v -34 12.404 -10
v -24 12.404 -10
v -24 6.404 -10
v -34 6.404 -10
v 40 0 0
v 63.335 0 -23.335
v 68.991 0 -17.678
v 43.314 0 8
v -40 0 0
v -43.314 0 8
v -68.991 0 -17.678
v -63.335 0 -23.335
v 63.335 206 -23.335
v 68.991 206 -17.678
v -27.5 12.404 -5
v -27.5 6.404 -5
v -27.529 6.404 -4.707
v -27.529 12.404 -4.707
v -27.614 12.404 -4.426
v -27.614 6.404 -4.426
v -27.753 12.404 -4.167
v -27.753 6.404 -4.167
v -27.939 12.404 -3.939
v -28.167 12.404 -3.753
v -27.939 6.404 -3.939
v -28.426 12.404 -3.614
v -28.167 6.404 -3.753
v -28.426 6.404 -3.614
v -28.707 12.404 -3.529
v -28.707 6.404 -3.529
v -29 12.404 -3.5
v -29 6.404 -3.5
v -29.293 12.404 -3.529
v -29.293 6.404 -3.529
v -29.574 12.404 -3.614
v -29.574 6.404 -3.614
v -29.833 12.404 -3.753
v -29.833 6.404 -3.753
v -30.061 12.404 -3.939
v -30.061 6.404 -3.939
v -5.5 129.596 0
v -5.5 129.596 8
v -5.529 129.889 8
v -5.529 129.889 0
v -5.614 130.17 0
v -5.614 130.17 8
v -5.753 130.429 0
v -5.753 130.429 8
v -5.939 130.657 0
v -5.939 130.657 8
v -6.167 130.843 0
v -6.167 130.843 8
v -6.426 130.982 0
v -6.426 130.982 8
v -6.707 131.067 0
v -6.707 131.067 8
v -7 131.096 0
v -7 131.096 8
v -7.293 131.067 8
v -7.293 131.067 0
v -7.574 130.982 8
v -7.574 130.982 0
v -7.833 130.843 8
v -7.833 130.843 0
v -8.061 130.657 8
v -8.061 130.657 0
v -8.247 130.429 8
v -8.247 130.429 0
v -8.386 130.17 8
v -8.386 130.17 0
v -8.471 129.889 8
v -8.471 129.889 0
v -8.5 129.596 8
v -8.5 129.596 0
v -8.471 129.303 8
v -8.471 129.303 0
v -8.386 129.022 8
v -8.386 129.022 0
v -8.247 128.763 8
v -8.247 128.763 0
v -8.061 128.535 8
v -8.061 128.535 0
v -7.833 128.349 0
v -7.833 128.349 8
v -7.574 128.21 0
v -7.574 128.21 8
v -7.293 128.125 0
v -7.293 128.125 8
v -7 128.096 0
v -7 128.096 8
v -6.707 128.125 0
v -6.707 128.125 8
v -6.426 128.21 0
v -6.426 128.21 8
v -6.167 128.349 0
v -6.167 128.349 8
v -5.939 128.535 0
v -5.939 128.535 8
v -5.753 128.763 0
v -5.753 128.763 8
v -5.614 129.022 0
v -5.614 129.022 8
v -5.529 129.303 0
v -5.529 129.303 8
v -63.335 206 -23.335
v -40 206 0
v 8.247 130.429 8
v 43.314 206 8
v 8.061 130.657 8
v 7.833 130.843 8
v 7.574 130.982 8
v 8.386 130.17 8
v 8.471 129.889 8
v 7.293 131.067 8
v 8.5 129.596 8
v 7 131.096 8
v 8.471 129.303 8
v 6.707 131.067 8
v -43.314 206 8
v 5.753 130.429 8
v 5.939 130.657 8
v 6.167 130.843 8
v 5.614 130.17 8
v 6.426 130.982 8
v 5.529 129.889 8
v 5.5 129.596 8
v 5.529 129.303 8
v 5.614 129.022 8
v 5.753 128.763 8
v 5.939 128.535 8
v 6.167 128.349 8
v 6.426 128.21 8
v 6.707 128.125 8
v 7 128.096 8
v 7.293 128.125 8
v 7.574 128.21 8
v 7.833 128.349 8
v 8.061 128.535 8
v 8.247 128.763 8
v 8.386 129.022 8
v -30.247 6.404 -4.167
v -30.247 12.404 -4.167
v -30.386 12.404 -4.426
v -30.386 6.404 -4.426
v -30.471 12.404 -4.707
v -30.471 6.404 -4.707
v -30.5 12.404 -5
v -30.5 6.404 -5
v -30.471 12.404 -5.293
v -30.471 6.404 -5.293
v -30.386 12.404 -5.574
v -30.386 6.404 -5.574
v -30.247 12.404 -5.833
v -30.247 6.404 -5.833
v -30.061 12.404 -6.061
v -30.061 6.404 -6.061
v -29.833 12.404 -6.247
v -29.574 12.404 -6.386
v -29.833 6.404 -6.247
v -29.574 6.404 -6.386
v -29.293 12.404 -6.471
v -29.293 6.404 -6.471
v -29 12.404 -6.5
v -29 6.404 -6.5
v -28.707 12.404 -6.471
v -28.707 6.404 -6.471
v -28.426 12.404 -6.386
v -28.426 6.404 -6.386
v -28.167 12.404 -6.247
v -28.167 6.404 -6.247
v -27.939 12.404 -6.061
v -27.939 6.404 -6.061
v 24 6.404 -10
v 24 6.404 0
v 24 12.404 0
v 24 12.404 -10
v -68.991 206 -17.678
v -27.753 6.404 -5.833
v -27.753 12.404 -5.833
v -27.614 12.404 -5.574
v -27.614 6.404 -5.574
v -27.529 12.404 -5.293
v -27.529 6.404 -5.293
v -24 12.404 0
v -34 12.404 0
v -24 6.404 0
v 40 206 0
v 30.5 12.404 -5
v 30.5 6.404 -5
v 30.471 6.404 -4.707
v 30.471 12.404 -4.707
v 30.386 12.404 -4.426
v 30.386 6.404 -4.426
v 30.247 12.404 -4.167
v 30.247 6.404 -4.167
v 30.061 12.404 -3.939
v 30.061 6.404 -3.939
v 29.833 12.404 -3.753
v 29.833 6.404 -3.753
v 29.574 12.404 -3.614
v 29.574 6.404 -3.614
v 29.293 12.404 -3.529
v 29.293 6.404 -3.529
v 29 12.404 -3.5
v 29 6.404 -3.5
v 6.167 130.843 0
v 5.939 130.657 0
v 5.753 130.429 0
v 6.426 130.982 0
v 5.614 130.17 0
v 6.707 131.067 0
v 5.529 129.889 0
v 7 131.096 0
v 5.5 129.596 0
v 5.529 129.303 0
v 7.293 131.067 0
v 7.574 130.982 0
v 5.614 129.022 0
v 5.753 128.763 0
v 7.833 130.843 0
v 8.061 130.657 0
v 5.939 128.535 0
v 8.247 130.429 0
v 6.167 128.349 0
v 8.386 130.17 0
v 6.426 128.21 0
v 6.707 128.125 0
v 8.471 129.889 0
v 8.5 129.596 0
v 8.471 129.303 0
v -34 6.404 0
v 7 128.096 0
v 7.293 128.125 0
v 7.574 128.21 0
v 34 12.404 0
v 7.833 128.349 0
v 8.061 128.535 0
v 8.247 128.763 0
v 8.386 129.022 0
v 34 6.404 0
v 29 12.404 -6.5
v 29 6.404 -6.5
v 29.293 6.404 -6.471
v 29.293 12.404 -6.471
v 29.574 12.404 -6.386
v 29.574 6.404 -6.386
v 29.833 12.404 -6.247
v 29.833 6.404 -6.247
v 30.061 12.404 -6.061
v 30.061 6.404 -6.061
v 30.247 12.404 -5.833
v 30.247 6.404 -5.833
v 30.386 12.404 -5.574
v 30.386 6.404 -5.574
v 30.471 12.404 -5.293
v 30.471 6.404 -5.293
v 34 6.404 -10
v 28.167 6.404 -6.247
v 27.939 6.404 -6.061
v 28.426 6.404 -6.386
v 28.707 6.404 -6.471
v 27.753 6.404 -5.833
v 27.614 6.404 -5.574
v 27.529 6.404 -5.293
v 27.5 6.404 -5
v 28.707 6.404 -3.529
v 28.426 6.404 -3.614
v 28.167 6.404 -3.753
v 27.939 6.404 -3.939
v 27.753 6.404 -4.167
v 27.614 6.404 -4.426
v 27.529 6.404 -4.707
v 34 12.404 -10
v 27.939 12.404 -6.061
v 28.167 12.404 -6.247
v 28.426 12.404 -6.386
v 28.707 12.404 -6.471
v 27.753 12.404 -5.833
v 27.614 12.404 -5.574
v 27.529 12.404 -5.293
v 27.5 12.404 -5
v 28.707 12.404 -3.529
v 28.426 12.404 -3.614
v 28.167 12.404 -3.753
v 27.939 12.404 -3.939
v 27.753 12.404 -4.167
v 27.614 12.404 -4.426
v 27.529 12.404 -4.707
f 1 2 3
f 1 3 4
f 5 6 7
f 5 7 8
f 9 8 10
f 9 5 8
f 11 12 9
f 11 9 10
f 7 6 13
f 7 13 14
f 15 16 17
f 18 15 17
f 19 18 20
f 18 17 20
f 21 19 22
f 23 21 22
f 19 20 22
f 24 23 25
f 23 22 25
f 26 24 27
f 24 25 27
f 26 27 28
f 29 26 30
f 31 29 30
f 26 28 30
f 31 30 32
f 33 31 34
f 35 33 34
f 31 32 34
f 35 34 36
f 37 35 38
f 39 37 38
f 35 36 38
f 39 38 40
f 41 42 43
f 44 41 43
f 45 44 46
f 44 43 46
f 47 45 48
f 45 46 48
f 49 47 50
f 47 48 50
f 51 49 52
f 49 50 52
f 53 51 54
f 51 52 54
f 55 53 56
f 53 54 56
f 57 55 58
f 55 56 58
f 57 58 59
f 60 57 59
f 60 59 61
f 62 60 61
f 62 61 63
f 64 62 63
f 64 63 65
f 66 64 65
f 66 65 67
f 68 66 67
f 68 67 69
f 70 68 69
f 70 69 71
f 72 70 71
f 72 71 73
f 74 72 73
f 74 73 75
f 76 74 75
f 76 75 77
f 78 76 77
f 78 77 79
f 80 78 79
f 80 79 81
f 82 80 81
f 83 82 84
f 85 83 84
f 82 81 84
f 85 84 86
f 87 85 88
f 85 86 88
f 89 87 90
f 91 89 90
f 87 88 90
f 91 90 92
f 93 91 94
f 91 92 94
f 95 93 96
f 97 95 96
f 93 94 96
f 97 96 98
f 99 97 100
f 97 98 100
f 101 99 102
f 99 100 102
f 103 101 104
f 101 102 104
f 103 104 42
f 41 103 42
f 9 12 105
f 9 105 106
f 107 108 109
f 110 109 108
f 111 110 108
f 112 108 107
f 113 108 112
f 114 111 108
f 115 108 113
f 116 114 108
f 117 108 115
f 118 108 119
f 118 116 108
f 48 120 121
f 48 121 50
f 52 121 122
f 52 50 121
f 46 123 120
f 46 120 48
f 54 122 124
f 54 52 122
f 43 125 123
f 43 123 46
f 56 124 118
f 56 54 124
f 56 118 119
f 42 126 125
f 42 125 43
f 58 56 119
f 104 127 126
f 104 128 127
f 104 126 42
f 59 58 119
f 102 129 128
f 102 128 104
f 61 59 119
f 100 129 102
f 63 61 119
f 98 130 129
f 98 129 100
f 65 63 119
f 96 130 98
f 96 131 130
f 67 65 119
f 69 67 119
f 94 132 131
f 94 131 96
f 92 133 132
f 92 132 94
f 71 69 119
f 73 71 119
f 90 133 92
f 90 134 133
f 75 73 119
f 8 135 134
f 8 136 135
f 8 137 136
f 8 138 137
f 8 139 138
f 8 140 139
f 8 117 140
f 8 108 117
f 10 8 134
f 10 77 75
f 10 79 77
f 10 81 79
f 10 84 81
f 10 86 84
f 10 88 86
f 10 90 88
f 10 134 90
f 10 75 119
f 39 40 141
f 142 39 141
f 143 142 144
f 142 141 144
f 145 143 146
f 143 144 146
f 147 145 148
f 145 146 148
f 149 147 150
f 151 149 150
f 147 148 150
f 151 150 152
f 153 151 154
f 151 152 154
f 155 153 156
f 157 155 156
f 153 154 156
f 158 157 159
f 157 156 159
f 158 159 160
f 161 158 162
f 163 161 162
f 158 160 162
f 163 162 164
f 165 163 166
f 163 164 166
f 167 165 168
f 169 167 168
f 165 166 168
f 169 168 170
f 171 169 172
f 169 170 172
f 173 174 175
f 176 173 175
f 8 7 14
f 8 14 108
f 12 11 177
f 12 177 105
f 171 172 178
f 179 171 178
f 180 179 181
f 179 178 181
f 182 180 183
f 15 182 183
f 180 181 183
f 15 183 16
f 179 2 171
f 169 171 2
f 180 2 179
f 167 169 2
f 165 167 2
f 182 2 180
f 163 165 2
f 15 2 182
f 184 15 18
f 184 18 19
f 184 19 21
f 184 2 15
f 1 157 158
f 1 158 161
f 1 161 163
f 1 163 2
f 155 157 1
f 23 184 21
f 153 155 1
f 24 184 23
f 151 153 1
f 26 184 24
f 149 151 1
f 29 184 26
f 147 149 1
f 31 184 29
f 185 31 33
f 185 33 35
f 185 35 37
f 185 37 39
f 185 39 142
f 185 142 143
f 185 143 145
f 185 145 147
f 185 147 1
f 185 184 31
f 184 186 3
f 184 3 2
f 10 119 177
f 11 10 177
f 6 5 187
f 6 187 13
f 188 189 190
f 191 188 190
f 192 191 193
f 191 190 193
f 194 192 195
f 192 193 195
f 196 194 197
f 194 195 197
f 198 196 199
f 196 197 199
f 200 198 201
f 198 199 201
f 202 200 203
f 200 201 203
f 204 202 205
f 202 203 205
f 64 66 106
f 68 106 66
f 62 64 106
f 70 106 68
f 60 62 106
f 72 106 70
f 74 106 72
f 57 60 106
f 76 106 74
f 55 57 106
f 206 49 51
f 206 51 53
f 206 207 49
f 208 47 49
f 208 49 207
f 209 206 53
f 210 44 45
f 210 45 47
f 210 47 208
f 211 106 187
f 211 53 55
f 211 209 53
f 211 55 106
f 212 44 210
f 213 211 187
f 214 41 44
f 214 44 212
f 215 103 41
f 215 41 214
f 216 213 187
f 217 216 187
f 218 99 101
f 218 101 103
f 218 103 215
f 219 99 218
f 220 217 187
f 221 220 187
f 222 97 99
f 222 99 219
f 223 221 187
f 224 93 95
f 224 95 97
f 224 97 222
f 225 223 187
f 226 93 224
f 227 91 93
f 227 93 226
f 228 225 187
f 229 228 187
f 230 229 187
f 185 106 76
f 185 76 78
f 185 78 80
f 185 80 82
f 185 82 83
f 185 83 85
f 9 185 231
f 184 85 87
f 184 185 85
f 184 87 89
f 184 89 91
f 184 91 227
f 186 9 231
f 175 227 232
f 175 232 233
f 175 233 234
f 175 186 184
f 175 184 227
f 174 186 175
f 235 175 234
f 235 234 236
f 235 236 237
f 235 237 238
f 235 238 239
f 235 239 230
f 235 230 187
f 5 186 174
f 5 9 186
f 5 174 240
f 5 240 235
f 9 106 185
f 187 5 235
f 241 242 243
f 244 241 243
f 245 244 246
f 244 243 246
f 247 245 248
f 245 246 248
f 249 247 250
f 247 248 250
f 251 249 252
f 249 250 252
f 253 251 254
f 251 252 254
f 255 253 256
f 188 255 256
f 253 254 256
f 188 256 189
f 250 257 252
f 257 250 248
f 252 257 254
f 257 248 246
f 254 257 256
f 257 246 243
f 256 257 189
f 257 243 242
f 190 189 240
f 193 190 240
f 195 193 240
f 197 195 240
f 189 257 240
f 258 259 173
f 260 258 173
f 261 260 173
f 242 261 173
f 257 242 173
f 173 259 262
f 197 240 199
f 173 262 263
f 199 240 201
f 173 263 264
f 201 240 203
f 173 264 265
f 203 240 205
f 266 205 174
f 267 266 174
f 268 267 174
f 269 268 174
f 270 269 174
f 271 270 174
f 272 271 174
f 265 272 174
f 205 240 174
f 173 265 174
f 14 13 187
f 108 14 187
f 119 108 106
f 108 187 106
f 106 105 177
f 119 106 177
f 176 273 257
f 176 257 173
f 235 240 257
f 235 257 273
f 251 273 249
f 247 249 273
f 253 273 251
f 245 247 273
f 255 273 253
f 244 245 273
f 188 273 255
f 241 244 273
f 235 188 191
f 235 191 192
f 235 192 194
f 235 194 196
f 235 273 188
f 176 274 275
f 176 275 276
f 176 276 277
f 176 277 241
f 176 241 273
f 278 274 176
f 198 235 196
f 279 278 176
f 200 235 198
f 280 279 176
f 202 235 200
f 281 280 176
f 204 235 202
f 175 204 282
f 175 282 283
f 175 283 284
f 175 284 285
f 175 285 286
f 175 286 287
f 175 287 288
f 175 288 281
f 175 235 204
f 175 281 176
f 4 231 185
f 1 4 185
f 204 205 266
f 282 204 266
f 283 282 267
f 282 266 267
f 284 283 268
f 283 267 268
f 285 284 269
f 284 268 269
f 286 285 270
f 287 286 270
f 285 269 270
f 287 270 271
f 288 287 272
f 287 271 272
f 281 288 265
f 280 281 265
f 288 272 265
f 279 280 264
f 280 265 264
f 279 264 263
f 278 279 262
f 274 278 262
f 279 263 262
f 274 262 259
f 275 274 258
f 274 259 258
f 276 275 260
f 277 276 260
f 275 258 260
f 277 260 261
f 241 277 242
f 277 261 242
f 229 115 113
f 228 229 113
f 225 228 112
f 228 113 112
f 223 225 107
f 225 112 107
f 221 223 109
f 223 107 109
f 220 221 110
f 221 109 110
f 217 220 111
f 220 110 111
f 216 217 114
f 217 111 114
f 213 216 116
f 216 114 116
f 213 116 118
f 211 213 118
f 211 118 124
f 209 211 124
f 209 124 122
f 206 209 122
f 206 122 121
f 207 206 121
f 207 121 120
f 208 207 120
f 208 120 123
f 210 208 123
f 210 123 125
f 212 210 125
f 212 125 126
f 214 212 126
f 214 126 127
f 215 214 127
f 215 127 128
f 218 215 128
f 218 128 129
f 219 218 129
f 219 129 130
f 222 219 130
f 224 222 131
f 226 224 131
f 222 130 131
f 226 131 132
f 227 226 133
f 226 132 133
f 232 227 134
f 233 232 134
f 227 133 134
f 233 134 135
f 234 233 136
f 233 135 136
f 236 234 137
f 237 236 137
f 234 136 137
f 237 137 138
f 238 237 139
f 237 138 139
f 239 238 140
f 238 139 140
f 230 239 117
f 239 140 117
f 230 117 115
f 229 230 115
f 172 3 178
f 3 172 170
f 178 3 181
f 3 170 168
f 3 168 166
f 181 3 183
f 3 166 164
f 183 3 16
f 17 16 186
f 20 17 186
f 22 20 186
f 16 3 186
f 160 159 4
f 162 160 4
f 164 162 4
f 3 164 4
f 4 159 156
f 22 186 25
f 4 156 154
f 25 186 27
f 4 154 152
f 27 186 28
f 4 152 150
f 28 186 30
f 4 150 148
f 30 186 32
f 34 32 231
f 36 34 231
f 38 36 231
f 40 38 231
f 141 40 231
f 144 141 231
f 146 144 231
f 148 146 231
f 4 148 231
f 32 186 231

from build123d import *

# Parameters (mm, degrees)
SALIENTE_EXTRUIR1_DEPTH = 206
CROQUIS2_W              = 10
CROQUIS2_H              = 6
SALIENTE_EXTRUIR2_DEPTH = 10
CORTAR_EXTRUIR1_DEPTH   = 10
CROQUIS4_R              = 1.5
CORTAR_EXTRUIR4_DEPTH   = 10


with BuildPart() as part:
    # Croquis1 → Saliente-Extruir1 (new body)
    with BuildSketch(Plane(origin=(0, 0, 0), x_dir=(1, 0, 0), z_dir=(0, 1, 0))):
        Polygon((-40, 0), (40, 0), (63.334523779, 23.334523779), (68.991378029, 17.67766953), (43.313708499, -8), (-43.313708499, -8), (-68.991378029, 17.67766953), (-63.334523779, 23.334523779), align=None)
    extrude(amount=SALIENTE_EXTRUIR1_DEPTH)

    # Croquis2 → Saliente-Extruir2 (add)
    with BuildSketch(Plane(origin=(0, 0, 0), x_dir=(-1, 0, 0), z_dir=(0, 0, -1))):
        with Locations((29, 9.404106992)):
            Rectangle(CROQUIS2_W, CROQUIS2_H)
        with Locations((-29, 9.404106992)):
            Rectangle(CROQUIS2_W, CROQUIS2_H)
    extrude(amount=SALIENTE_EXTRUIR2_DEPTH)

    # Croquis3 → Cortar-Extruir1 (cut)
    with BuildSketch(Plane.XZ.offset(-6.404106992)):
        with BuildLine():
            ThreePointArc((-27.5, -5), (-28.425974851, -3.614180701), (-30.060660172, -3.939339828))
            Line((-30.060660172, -3.939339828), (-27.939339828, -6.060660172))
            ThreePointArc((-27.939339828, -6.060660172), (-27.614180701, -5.574025149), (-27.5, -5))
        make_face()
        with BuildLine():
            Line((-27.939339828, -6.060660172), (-30.060660172, -3.939339828))
            ThreePointArc((-30.060660172, -3.939339828), (-30.060660172, -6.060660172), (-27.939339828, -6.060660172))
        make_face()
        with BuildLine():
            ThreePointArc((29, -3.5), (27.5, -5), (29, -6.5))
            Line((29, -6.5), (29, -3.5))
        make_face()
        with BuildLine():
            Line((29, -3.5), (29, -6.5))
            ThreePointArc((29, -6.5), (30.060660172, -6.060660172), (30.5, -5))
            ThreePointArc((30.5, -5), (30.060660172, -3.939339828), (29, -3.5))
        make_face()
    extrude(amount=-CORTAR_EXTRUIR1_DEPTH, mode=Mode.SUBTRACT)

    # Croquis4 → Cortar-Extruir4 (cut)
    with BuildSketch(Plane.XY.offset(8)):
        with Locations((-7.000068571, 129.596)):
            Circle(CROQUIS4_R)
        with Locations((6.999931429, 129.596)):
            Circle(CROQUIS4_R)
    extrude(amount=-CORTAR_EXTRUIR4_DEPTH, mode=Mode.SUBTRACT)


solid = part.part
